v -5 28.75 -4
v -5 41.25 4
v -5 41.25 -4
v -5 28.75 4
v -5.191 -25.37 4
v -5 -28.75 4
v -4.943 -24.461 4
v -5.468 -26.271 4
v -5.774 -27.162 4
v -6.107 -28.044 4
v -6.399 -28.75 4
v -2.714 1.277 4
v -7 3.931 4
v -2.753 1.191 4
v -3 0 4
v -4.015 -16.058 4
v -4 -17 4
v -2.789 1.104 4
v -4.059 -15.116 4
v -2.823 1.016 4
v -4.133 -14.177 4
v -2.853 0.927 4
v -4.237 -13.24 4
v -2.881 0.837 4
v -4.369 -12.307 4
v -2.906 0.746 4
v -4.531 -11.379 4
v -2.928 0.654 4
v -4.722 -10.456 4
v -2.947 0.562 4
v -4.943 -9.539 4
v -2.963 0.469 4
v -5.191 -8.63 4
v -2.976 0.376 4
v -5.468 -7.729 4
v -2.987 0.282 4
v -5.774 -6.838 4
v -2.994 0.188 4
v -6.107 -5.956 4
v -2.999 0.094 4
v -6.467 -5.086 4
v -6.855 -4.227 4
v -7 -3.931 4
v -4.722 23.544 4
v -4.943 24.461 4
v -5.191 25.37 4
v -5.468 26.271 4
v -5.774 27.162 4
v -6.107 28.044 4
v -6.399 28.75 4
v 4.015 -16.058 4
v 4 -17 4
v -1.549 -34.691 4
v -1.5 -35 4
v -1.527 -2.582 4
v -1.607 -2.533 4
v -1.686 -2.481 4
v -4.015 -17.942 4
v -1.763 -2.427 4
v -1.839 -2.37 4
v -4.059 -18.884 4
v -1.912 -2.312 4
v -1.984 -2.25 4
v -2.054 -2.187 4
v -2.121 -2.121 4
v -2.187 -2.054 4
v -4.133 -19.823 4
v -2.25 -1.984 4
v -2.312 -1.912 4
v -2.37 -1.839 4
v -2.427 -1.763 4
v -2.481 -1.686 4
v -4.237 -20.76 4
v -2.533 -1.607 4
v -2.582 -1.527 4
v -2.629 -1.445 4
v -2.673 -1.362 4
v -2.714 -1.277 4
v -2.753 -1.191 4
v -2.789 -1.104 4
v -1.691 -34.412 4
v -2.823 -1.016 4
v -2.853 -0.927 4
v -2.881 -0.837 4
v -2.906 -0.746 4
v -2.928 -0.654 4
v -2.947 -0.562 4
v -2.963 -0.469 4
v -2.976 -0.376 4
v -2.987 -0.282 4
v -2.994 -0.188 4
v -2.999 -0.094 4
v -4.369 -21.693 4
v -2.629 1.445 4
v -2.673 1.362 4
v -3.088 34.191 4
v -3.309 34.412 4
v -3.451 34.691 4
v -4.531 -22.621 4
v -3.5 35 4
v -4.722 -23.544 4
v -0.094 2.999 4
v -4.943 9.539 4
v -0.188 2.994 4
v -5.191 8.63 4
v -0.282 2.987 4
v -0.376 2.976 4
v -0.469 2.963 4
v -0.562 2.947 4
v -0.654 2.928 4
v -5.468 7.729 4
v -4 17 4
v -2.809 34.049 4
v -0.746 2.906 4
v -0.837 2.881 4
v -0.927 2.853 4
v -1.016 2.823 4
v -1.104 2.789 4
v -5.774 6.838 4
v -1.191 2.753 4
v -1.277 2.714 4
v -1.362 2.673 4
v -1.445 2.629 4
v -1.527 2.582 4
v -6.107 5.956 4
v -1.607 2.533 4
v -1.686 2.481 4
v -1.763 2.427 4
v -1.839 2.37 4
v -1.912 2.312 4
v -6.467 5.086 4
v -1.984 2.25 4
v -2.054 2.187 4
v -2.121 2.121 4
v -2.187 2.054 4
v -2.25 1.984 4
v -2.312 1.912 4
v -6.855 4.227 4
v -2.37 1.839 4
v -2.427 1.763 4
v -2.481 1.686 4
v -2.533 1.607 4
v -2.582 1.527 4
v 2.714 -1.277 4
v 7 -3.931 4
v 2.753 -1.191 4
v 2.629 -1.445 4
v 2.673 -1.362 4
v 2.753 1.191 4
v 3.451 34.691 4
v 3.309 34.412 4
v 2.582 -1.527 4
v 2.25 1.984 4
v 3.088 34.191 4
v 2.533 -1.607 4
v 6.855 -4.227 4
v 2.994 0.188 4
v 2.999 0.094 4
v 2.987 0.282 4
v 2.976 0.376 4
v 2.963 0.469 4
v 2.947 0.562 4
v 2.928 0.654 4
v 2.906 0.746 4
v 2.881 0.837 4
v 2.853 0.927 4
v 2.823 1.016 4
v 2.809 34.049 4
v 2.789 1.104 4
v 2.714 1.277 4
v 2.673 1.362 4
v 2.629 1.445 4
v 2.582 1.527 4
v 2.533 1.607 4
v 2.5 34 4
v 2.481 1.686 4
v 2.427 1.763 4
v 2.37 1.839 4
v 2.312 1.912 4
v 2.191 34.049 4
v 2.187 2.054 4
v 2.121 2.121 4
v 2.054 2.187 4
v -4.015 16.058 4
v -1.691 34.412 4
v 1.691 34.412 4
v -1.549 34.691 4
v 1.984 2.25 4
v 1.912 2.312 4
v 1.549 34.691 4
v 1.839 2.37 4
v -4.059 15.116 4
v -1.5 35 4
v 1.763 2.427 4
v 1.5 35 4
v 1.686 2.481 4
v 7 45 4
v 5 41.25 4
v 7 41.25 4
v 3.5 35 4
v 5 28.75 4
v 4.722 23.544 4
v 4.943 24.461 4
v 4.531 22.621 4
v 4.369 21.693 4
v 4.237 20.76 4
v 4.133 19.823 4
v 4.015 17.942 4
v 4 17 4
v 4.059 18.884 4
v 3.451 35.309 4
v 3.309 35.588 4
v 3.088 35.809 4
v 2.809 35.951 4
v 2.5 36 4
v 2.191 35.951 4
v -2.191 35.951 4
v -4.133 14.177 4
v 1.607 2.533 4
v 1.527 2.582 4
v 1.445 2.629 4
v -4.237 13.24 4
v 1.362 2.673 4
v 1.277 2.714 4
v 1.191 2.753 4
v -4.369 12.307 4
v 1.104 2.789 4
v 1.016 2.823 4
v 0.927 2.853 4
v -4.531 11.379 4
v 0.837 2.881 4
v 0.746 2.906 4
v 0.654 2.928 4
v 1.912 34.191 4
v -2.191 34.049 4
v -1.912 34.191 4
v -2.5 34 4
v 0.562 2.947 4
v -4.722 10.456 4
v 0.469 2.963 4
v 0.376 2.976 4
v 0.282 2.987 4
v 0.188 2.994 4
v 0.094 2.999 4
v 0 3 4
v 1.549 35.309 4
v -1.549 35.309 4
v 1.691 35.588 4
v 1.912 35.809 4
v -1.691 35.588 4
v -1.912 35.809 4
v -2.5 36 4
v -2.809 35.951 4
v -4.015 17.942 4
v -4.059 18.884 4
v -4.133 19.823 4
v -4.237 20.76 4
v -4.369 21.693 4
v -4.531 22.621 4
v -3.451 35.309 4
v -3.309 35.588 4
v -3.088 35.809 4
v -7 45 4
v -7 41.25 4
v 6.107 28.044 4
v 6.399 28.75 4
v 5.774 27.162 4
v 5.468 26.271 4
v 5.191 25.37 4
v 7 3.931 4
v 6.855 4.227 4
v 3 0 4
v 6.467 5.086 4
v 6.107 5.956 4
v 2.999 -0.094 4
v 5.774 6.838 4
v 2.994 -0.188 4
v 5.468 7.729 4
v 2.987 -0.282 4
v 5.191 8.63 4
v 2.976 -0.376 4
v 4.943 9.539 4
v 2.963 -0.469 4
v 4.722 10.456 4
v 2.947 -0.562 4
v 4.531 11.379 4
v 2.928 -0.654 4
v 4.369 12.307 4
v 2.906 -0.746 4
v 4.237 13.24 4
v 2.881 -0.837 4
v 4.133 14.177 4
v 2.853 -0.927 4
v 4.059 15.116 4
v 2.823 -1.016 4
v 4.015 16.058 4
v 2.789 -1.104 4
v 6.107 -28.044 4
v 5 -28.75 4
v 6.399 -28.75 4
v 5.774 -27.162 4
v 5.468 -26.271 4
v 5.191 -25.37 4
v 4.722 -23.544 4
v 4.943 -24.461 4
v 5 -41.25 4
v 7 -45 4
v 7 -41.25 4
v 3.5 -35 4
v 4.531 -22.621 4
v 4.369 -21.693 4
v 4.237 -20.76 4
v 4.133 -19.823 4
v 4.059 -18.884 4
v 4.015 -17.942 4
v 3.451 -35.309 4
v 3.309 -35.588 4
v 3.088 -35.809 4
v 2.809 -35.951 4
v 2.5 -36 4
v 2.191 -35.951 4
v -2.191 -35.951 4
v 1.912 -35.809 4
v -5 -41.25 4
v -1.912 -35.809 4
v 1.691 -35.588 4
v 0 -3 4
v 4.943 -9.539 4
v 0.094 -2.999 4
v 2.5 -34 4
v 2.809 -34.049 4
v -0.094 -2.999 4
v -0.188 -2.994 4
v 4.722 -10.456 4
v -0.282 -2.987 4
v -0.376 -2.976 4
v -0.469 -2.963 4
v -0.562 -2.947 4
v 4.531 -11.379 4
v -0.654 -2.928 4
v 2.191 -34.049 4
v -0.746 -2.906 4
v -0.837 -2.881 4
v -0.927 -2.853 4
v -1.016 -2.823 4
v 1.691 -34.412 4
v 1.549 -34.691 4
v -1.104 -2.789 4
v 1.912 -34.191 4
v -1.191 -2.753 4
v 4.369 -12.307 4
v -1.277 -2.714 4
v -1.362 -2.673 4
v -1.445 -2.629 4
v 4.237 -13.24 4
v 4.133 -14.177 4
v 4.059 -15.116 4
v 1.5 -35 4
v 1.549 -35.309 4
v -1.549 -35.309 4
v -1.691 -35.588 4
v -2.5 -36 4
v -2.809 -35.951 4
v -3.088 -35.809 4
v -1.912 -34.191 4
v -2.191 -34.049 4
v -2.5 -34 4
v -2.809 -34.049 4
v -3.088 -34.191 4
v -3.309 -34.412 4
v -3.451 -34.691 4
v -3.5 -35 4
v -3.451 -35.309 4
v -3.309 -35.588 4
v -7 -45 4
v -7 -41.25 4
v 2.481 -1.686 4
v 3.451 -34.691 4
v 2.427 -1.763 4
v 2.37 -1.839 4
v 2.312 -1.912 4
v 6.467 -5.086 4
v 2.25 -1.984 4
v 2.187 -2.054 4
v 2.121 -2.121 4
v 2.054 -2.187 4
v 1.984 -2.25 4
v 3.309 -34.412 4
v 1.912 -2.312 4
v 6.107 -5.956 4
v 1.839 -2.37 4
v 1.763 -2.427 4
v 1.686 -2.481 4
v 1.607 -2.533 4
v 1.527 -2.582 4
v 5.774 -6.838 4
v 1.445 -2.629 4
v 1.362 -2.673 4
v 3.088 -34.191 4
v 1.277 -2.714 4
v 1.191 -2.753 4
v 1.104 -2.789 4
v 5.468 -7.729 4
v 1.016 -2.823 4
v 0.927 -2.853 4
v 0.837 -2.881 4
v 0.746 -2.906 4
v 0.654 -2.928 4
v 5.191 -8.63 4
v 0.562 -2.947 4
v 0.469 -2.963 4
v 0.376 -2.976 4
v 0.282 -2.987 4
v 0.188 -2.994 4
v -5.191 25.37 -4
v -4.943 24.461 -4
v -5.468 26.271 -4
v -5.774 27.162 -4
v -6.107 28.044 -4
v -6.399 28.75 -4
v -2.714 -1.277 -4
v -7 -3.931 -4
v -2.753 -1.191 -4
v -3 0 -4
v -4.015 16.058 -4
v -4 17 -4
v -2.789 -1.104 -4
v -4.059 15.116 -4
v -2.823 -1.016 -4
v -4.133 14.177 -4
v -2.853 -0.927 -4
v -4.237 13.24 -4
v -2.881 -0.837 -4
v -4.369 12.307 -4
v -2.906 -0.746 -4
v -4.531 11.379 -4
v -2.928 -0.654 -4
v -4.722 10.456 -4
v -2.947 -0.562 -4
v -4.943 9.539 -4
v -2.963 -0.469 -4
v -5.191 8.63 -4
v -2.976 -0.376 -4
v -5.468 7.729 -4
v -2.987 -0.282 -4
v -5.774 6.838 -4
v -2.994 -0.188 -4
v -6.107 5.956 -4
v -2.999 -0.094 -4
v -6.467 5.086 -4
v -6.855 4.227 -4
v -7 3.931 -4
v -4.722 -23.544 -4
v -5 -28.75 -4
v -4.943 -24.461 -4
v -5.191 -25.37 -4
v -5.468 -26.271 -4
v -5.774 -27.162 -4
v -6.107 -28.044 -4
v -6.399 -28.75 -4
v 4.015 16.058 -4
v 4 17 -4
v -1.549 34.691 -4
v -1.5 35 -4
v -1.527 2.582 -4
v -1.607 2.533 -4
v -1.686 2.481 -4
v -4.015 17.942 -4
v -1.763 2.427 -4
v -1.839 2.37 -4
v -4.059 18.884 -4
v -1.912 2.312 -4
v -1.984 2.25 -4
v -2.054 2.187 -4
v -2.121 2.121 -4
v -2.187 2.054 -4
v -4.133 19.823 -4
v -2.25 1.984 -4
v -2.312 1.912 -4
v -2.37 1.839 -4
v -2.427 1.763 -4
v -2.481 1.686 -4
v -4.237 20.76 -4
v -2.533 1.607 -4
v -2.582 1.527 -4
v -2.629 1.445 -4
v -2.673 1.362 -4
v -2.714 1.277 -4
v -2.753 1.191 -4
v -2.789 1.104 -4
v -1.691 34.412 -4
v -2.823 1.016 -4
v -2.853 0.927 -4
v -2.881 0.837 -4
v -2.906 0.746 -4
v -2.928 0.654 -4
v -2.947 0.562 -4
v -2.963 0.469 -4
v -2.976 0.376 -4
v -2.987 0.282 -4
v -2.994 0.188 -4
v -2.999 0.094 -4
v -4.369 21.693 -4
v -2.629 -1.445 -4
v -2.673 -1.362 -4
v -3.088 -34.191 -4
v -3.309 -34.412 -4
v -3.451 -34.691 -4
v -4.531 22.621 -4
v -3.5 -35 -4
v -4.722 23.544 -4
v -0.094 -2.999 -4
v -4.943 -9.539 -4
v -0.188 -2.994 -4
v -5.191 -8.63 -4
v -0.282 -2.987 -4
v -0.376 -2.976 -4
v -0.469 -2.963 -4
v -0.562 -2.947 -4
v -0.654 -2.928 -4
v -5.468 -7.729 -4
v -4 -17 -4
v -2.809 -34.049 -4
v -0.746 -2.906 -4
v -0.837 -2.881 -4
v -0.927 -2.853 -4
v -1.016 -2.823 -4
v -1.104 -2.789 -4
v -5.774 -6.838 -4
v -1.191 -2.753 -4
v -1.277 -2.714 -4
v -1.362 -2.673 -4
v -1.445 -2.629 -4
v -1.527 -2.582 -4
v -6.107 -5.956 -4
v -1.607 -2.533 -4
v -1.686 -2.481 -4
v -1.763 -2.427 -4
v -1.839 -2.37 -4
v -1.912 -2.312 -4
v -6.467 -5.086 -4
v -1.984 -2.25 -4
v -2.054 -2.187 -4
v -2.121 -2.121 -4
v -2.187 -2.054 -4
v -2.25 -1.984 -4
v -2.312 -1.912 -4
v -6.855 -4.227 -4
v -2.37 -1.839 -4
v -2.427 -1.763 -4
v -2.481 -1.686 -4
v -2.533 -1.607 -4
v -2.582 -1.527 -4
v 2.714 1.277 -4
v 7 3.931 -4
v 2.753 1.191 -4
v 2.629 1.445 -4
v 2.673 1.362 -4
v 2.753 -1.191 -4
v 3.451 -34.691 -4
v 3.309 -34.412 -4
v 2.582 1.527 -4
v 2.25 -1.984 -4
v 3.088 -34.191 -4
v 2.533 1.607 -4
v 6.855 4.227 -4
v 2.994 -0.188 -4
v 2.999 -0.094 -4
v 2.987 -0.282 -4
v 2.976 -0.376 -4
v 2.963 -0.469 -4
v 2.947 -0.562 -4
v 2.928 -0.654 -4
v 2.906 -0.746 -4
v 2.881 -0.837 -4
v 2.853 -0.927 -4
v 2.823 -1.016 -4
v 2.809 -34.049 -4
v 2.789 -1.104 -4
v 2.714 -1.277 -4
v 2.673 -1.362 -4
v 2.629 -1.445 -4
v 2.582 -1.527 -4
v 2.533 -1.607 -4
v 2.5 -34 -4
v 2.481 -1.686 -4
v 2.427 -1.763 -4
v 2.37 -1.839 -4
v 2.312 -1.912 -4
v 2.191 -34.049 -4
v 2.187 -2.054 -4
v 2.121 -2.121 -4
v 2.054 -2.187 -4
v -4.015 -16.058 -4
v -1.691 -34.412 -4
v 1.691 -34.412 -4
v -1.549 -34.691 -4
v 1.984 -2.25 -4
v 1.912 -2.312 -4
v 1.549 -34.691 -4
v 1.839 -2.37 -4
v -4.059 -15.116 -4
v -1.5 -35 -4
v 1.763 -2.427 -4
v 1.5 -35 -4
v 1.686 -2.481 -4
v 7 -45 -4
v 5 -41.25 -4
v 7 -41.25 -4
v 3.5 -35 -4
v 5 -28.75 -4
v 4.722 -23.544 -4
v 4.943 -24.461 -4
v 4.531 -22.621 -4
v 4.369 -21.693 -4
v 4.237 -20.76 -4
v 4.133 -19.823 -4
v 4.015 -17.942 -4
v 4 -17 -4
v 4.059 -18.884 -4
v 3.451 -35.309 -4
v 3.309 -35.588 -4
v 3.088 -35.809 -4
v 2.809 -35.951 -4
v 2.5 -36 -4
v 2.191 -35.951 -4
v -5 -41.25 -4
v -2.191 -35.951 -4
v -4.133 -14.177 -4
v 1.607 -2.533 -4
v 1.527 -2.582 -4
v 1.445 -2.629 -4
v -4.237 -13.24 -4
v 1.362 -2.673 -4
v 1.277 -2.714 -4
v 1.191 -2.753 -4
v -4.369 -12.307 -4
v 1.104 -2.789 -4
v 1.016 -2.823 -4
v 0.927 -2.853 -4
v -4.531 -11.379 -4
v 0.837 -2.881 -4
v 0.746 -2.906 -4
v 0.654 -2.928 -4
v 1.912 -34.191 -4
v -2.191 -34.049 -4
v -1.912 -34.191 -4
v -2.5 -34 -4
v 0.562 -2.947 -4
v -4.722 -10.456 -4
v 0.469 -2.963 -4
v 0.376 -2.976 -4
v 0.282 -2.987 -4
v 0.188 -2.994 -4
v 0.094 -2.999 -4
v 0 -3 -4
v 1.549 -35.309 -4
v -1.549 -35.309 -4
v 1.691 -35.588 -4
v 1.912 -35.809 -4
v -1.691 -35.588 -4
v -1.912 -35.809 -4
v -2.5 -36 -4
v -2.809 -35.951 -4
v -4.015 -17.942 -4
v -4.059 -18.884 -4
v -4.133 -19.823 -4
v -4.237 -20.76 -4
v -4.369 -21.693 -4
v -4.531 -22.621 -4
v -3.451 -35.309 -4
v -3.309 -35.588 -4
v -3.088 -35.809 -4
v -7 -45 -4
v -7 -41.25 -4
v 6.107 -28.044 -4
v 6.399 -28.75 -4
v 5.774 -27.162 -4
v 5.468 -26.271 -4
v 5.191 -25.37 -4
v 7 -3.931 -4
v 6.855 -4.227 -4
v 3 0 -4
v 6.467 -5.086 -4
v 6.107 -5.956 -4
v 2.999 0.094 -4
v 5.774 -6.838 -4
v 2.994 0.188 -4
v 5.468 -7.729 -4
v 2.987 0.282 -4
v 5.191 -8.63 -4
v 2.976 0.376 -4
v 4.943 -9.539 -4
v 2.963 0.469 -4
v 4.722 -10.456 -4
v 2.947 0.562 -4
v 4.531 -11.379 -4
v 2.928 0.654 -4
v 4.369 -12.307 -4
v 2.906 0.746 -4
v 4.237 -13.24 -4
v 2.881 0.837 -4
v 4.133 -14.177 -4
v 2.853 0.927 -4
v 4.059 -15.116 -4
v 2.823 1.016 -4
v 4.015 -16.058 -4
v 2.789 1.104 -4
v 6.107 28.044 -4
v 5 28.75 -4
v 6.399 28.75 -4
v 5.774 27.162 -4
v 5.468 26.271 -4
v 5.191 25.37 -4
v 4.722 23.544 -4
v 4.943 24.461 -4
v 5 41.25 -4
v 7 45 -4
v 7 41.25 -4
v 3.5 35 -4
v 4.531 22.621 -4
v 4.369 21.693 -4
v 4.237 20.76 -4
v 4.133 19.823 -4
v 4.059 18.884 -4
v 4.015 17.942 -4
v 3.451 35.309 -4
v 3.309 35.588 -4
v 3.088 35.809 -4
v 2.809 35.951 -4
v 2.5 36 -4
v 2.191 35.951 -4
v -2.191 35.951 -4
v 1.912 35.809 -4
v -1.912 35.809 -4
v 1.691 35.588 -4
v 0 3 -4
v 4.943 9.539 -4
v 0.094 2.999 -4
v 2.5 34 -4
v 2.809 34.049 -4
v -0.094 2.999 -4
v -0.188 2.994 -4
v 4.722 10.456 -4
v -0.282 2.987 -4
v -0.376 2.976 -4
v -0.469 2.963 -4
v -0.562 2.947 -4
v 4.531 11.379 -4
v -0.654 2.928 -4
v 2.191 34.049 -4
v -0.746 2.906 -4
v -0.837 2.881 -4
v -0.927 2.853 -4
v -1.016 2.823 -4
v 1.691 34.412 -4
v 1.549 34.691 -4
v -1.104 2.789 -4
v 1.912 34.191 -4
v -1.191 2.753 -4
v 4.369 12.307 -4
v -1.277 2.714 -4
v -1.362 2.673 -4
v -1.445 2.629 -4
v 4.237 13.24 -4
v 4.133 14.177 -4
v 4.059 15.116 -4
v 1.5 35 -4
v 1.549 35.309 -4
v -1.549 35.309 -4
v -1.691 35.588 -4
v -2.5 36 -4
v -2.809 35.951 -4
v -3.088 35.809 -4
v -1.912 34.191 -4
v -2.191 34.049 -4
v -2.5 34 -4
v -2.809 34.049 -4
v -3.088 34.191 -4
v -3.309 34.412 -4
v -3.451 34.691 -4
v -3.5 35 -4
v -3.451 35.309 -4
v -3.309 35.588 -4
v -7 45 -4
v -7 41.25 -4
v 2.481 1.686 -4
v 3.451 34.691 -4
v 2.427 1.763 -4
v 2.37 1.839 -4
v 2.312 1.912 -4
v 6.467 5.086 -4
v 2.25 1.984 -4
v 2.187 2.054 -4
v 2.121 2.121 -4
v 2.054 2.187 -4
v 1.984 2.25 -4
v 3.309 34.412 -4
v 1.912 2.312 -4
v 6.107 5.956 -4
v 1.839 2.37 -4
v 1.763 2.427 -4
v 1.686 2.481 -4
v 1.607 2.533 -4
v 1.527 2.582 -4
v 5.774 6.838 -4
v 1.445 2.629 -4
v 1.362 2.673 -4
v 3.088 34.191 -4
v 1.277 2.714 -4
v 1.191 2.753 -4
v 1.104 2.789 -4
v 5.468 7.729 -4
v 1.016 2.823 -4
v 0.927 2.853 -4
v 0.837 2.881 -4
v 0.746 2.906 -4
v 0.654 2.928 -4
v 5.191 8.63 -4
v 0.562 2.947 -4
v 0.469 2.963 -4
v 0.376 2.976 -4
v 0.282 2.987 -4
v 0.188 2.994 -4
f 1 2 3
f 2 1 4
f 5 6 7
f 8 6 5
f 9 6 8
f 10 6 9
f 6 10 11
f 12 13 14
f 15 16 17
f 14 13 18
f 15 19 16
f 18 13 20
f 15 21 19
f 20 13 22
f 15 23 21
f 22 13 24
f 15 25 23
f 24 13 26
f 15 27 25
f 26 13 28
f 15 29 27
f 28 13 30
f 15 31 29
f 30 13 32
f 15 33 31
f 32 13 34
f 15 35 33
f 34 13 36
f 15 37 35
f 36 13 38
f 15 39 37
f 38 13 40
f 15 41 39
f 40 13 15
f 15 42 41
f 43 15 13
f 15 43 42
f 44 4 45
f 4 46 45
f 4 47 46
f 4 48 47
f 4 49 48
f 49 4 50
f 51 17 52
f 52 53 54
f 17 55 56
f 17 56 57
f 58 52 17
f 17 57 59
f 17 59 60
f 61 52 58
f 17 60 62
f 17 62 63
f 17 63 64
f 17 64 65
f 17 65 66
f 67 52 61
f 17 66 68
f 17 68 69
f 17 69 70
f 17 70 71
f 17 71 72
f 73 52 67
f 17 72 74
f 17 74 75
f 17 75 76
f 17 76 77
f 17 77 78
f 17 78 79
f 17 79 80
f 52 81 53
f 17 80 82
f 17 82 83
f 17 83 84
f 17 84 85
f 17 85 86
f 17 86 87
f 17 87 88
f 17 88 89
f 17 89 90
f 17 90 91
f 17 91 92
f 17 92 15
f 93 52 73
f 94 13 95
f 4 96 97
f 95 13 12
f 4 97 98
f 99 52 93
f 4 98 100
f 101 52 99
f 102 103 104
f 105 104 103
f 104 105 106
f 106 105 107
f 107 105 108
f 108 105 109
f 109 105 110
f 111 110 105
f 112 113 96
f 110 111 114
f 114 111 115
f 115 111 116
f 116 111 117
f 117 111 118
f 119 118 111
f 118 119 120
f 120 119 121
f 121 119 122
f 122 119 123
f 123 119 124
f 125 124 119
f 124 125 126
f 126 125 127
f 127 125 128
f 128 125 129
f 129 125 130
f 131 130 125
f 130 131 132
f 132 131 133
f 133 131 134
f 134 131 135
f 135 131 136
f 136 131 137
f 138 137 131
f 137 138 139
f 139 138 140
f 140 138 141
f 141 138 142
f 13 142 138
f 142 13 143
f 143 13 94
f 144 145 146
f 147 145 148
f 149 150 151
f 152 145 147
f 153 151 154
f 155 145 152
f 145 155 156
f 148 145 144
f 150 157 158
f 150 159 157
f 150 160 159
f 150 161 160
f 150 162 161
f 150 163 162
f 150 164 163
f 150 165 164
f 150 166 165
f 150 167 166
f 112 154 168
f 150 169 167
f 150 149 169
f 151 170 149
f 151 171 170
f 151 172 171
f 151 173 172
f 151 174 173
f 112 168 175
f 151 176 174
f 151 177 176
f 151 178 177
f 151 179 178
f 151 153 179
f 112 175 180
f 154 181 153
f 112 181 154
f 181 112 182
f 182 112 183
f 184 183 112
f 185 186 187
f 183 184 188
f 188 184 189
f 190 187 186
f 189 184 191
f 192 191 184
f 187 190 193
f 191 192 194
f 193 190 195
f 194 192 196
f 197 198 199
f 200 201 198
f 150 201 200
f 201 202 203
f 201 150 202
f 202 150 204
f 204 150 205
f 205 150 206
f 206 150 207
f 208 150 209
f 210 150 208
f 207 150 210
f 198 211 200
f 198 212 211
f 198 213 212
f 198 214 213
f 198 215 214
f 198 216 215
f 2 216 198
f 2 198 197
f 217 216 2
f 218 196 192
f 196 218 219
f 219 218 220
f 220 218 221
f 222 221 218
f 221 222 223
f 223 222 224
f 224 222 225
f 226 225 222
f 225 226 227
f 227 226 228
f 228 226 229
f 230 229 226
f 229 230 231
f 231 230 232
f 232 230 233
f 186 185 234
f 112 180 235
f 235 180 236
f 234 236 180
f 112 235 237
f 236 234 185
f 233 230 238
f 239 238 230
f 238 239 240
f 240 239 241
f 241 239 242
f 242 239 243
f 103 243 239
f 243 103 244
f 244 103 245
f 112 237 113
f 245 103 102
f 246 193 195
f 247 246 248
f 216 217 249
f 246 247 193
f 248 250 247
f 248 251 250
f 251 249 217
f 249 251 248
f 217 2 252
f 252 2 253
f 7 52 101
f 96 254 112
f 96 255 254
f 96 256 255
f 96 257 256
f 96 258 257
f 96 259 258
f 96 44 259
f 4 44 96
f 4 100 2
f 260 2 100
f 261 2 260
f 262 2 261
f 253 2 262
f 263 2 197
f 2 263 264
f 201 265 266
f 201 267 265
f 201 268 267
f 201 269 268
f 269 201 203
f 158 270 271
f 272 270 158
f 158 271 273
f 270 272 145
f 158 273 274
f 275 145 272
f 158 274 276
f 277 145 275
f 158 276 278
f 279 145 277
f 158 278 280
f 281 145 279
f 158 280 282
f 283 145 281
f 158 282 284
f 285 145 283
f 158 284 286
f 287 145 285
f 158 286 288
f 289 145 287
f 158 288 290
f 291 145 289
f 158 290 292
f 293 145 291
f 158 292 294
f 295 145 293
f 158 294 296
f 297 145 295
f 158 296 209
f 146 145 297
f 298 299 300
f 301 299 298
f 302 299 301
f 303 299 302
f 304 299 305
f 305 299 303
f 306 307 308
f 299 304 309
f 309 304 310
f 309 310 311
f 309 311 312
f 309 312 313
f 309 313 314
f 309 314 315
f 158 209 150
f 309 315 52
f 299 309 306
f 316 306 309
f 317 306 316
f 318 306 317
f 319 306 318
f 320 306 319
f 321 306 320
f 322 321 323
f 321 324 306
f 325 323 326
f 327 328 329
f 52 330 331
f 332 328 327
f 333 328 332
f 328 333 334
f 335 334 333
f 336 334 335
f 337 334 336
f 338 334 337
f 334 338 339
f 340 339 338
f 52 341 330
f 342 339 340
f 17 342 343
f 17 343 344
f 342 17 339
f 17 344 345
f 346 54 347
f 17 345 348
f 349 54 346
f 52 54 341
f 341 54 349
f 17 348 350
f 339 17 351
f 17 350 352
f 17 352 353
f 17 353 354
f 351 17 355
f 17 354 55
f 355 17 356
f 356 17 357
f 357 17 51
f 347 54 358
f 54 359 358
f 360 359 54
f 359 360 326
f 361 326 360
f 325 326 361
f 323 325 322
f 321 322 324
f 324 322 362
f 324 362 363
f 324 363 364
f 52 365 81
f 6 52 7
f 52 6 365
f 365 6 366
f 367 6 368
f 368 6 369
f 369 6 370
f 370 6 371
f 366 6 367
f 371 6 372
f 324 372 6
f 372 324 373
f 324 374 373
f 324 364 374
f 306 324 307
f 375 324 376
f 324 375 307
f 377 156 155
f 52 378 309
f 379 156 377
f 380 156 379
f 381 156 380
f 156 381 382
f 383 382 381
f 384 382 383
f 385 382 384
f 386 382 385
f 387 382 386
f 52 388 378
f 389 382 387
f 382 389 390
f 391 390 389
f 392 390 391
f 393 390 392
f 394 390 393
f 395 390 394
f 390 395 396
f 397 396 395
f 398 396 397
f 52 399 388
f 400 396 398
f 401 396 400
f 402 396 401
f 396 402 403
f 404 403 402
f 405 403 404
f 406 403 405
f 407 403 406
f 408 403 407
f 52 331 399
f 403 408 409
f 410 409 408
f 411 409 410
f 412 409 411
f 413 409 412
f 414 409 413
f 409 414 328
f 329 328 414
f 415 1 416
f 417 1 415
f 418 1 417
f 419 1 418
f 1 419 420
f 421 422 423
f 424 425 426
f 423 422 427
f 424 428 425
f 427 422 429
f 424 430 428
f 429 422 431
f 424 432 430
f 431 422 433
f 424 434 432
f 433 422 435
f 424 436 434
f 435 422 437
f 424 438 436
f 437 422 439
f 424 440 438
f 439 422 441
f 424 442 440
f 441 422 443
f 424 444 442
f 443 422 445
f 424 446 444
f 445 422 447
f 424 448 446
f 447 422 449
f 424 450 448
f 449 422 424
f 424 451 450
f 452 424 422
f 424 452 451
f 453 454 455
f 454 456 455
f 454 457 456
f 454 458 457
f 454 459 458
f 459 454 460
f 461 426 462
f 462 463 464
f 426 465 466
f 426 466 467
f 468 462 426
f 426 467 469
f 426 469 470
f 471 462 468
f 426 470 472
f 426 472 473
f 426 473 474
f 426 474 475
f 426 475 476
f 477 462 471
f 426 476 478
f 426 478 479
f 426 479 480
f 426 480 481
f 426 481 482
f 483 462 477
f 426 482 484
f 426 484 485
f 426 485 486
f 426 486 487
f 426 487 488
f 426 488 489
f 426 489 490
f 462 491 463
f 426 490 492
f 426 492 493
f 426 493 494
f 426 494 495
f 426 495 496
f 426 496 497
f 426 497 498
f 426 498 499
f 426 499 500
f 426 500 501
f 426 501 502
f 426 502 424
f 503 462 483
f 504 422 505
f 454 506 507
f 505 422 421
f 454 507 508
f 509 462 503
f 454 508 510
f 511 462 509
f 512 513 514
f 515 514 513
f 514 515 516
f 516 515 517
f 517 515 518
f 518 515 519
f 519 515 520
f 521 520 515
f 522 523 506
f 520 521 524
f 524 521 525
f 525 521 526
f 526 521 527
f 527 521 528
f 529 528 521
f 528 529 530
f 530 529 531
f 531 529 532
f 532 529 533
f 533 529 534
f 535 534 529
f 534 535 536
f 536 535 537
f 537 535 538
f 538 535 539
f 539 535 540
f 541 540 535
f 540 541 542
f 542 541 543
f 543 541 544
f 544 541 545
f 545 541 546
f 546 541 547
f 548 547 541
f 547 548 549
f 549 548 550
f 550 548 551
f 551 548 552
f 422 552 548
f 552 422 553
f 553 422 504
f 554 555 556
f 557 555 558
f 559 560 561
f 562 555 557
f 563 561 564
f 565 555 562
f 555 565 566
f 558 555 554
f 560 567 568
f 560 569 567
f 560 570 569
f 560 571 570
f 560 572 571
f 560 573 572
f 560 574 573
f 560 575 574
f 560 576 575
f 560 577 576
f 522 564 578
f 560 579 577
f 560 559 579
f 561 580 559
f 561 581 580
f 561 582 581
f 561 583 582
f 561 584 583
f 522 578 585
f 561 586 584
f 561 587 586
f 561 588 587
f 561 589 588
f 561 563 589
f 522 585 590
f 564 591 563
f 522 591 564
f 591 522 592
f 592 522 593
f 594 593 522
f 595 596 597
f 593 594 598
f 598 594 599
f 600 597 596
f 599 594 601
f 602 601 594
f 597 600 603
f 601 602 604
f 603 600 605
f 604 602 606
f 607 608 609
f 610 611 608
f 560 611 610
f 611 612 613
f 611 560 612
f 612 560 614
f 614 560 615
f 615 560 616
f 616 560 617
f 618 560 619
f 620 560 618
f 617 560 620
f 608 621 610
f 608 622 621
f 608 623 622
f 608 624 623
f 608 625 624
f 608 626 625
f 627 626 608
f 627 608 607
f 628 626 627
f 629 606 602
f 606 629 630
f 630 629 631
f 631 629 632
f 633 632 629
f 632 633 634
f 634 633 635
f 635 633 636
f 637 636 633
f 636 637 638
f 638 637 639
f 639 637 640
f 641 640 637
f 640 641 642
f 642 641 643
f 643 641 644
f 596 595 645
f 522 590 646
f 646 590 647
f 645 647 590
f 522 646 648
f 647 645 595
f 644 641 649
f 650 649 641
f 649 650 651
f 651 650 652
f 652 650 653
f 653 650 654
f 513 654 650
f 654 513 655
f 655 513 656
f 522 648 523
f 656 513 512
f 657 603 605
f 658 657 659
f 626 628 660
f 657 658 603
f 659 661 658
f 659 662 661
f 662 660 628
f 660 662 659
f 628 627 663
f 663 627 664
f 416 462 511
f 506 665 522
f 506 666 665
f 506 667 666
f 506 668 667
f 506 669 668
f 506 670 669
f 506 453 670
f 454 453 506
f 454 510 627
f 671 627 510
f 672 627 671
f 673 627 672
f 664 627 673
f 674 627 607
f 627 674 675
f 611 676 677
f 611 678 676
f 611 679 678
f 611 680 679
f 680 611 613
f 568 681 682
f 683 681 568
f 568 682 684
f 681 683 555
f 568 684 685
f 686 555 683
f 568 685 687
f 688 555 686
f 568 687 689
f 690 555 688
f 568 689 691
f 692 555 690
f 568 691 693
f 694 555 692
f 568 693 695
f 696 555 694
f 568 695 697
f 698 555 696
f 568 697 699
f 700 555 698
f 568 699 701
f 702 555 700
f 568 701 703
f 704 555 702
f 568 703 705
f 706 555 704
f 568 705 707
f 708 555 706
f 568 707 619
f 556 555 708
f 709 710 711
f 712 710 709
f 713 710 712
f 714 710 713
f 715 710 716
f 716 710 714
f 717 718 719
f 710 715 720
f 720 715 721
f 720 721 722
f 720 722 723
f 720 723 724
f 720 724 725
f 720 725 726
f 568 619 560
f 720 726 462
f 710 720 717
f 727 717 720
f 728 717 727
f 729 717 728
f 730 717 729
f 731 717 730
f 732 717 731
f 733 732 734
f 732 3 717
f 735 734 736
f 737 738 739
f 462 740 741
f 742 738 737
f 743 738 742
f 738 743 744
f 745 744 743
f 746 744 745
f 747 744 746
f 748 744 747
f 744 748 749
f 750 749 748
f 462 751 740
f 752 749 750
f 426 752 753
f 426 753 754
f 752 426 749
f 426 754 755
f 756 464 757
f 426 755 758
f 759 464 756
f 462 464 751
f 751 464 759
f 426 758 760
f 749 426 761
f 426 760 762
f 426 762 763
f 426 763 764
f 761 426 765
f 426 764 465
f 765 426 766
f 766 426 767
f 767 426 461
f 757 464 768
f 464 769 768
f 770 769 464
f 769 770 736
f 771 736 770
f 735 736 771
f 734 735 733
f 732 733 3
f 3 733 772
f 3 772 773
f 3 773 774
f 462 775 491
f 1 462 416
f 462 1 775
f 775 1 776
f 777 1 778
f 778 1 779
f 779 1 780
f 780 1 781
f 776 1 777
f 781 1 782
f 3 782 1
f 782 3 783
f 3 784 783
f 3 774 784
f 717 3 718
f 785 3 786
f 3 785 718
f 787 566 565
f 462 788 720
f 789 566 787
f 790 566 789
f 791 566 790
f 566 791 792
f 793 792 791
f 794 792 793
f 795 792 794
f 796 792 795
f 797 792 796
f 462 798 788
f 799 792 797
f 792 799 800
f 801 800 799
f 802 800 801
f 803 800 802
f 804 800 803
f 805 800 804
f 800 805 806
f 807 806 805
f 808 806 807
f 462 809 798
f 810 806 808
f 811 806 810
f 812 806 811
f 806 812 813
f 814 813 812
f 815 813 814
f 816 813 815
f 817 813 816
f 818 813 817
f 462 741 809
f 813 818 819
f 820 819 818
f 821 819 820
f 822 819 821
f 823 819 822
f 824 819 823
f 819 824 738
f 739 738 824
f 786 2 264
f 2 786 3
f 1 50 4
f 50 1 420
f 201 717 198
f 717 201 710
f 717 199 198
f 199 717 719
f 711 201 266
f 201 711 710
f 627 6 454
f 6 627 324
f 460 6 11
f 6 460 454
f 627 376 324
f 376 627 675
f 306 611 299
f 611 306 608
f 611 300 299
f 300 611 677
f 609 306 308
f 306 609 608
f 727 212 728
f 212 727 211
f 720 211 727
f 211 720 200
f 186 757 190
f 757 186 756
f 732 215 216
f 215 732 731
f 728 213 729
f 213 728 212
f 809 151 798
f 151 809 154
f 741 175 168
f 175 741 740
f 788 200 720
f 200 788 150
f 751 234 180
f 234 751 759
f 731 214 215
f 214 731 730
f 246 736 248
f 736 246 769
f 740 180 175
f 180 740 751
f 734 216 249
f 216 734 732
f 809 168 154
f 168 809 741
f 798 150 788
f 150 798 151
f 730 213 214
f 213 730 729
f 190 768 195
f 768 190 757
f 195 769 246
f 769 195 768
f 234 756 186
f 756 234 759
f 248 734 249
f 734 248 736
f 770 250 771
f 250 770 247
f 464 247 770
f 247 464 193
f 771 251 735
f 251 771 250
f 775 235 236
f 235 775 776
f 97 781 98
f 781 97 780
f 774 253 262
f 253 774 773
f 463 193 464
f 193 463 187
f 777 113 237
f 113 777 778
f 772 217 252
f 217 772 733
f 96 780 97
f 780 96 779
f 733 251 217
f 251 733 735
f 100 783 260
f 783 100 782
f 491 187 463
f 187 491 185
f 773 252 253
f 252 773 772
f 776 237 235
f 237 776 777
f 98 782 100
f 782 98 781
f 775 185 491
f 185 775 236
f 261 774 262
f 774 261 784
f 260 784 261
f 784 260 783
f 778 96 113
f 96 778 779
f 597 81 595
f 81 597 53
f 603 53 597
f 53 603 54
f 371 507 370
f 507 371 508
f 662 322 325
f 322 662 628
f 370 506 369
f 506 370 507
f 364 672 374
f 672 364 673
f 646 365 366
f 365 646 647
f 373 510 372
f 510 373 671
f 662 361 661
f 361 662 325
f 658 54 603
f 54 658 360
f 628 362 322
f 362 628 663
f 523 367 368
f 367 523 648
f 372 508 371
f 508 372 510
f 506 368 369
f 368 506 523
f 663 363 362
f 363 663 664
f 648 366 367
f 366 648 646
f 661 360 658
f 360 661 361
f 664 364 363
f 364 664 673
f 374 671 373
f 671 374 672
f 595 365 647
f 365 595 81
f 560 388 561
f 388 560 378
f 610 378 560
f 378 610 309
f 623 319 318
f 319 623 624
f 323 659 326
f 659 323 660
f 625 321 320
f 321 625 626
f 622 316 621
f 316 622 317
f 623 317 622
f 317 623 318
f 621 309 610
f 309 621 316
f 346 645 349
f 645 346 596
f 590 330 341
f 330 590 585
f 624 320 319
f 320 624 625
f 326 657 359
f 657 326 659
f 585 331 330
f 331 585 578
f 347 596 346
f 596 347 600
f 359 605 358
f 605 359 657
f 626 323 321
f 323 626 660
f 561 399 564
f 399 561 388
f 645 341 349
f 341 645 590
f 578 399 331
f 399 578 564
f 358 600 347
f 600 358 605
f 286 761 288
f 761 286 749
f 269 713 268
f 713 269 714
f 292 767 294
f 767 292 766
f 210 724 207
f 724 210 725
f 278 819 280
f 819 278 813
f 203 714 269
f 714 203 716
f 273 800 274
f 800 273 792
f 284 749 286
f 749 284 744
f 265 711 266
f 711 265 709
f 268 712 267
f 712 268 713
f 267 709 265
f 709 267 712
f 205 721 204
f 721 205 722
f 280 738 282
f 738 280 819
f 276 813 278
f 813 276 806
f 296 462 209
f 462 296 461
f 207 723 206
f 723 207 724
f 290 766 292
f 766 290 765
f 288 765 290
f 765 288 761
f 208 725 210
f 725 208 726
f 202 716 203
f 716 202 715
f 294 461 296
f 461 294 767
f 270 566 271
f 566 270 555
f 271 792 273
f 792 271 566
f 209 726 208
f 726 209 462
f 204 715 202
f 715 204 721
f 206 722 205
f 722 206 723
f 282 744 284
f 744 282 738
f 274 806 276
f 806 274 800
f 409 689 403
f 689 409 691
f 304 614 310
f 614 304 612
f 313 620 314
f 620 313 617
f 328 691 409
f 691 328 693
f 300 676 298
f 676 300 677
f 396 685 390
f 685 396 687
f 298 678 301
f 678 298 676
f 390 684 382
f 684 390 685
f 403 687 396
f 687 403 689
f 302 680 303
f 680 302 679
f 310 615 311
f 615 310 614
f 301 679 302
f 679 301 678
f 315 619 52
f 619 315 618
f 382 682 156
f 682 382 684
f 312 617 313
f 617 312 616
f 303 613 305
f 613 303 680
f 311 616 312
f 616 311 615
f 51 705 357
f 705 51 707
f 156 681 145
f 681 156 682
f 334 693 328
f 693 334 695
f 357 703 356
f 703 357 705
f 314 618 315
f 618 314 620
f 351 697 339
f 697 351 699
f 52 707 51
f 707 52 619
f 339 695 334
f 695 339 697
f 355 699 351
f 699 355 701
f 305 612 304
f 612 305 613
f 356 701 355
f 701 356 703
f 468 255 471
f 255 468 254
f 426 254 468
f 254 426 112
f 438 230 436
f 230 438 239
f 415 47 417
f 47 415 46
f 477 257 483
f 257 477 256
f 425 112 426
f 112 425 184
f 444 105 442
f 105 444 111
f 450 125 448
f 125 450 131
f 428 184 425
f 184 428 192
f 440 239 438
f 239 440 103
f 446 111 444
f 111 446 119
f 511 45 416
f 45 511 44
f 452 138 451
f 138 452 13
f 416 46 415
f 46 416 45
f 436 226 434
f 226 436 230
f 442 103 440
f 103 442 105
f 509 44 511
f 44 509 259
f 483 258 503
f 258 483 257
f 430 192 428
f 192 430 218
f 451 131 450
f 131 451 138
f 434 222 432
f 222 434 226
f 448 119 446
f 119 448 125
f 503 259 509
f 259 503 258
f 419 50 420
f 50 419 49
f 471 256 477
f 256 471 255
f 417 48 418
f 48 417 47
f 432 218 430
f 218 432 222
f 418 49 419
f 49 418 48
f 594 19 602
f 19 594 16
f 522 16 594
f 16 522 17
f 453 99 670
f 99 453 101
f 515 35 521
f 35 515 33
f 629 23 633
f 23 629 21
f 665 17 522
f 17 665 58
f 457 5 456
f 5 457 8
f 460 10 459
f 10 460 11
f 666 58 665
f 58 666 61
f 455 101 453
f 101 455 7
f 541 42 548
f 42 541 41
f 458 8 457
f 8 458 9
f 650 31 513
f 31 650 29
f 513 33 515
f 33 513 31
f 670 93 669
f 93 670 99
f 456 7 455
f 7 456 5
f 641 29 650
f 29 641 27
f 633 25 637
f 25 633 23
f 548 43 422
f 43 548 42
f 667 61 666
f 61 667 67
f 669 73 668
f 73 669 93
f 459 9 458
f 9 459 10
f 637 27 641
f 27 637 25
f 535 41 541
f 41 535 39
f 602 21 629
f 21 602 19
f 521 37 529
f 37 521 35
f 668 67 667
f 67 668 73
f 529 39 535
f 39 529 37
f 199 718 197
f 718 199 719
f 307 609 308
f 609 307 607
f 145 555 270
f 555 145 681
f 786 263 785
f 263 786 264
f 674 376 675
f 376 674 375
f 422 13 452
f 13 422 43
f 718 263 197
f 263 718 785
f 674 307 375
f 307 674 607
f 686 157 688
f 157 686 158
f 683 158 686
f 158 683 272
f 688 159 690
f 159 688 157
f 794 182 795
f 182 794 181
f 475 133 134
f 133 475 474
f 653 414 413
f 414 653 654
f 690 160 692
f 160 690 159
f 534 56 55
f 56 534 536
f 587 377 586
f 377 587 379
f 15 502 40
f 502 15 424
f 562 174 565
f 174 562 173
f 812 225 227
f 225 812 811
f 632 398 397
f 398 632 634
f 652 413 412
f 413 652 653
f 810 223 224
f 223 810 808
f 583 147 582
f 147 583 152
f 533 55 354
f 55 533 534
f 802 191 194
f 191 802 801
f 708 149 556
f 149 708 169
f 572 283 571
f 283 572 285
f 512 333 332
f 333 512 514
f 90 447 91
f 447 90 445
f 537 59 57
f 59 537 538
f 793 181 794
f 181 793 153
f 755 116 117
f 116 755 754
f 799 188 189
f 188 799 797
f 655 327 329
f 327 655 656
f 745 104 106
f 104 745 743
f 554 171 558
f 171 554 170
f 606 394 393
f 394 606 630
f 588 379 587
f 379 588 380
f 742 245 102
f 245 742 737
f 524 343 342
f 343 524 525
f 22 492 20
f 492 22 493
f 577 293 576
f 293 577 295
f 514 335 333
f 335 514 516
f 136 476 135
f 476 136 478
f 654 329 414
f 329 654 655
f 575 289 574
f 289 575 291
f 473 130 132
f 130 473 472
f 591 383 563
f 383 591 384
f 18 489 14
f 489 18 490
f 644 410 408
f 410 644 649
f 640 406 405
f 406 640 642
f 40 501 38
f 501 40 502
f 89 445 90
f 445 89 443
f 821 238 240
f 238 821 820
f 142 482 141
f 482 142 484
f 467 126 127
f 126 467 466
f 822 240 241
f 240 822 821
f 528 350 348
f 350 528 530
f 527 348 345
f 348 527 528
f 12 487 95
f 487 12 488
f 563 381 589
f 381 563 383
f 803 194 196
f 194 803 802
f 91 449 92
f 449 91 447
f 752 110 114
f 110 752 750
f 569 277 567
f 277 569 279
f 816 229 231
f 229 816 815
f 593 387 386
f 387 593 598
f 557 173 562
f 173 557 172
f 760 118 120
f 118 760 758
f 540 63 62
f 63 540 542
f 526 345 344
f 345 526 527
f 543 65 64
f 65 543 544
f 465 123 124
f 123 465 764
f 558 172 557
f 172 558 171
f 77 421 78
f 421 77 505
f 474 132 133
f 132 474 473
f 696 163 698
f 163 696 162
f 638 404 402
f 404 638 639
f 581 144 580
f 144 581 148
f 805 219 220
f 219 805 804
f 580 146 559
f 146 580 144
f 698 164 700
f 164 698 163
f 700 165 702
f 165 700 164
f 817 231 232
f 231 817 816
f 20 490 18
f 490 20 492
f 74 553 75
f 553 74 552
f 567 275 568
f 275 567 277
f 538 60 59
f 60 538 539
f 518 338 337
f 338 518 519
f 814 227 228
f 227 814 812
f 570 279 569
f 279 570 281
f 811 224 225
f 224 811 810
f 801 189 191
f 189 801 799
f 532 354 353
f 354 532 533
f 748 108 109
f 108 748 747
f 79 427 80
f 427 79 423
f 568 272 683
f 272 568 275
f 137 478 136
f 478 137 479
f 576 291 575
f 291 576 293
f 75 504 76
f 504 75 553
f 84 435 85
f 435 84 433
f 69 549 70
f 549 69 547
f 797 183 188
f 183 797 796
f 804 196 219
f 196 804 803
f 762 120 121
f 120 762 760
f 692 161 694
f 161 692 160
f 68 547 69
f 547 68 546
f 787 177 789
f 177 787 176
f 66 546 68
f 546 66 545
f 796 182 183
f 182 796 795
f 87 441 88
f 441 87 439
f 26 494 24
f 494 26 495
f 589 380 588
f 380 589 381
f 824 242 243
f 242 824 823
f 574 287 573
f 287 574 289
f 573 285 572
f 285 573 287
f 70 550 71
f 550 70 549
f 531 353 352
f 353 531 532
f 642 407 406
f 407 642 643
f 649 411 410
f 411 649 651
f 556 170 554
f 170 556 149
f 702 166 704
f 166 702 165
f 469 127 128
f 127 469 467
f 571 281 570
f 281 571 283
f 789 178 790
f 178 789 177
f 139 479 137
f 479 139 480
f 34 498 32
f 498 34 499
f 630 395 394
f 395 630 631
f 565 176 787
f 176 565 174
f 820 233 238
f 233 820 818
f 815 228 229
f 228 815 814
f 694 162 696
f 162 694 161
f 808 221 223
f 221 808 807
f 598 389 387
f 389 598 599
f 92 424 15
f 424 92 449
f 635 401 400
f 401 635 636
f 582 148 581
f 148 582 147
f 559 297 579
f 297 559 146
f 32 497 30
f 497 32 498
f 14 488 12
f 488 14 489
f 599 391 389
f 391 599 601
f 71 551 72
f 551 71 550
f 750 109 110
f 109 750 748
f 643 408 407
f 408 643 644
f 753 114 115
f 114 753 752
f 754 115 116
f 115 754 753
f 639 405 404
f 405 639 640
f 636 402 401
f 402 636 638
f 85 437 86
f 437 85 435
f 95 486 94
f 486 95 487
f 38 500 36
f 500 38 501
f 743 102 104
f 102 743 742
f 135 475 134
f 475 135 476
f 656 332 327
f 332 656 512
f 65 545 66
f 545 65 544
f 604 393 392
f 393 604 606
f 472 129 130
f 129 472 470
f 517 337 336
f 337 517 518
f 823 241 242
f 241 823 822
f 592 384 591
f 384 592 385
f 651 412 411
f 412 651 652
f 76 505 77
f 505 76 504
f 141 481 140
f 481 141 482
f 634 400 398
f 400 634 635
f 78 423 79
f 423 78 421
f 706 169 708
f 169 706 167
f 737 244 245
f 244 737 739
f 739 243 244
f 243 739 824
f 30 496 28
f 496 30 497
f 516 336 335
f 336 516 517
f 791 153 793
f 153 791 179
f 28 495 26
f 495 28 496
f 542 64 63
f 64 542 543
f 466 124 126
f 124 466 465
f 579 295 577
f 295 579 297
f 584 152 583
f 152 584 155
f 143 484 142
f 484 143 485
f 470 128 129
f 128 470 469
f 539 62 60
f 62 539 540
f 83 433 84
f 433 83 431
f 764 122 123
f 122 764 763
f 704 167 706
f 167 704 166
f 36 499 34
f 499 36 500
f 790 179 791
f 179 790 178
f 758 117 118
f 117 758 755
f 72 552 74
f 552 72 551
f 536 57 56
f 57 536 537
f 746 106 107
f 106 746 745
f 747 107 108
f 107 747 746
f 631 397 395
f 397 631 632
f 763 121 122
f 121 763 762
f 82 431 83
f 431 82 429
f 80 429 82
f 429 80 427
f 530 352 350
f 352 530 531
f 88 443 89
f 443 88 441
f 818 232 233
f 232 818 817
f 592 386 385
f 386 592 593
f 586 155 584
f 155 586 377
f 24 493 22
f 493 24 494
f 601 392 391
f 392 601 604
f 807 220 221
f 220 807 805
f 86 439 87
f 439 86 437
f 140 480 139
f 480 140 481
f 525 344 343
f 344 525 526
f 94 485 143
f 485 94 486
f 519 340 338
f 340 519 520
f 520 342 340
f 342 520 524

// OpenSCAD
backbone(90,14,8,23,12.5);

module backbone(backbone_length, backbone_width, backbone_height, shoulder_length, shoulder_width){
	h_pos = ((backbone_length-20) / 2);		
	difference(){
		// main
		translate([-(backbone_width/2),-(backbone_length/2),-(backbone_height/2)]) color("purple") cube([backbone_width,backbone_length,backbone_height]);

		//servo body cutouts
		for (i = [[-16.5,h_pos,0],[16.5,h_pos,0],[-16.5,-h_pos,0],[16.5,-h_pos,0]]){
			translate(i) #cube([shoulder_length,shoulder_width,backbone_height], center=true);
		}		

		//servo mount holes
		for (i = [[2.5,h_pos,-10],[-2.5,h_pos,-10],[-2.5,-h_pos,-10],[2.5,-h_pos,-10]]){
			translate(i) cylinder(r=1,h=20,$fn=20);
		}

		//round side indents
		for (i = [[34,17,-5],[34,-17,-5],[-34,17,-5],[-34,-17,-5]]) {
			translate(i) cylinder(r=30,h=10,$fn=200);
		}

		//center hole
		translate([0,0,-4]) cylinder(r=3,h=10,$fn=200);
	}
}
